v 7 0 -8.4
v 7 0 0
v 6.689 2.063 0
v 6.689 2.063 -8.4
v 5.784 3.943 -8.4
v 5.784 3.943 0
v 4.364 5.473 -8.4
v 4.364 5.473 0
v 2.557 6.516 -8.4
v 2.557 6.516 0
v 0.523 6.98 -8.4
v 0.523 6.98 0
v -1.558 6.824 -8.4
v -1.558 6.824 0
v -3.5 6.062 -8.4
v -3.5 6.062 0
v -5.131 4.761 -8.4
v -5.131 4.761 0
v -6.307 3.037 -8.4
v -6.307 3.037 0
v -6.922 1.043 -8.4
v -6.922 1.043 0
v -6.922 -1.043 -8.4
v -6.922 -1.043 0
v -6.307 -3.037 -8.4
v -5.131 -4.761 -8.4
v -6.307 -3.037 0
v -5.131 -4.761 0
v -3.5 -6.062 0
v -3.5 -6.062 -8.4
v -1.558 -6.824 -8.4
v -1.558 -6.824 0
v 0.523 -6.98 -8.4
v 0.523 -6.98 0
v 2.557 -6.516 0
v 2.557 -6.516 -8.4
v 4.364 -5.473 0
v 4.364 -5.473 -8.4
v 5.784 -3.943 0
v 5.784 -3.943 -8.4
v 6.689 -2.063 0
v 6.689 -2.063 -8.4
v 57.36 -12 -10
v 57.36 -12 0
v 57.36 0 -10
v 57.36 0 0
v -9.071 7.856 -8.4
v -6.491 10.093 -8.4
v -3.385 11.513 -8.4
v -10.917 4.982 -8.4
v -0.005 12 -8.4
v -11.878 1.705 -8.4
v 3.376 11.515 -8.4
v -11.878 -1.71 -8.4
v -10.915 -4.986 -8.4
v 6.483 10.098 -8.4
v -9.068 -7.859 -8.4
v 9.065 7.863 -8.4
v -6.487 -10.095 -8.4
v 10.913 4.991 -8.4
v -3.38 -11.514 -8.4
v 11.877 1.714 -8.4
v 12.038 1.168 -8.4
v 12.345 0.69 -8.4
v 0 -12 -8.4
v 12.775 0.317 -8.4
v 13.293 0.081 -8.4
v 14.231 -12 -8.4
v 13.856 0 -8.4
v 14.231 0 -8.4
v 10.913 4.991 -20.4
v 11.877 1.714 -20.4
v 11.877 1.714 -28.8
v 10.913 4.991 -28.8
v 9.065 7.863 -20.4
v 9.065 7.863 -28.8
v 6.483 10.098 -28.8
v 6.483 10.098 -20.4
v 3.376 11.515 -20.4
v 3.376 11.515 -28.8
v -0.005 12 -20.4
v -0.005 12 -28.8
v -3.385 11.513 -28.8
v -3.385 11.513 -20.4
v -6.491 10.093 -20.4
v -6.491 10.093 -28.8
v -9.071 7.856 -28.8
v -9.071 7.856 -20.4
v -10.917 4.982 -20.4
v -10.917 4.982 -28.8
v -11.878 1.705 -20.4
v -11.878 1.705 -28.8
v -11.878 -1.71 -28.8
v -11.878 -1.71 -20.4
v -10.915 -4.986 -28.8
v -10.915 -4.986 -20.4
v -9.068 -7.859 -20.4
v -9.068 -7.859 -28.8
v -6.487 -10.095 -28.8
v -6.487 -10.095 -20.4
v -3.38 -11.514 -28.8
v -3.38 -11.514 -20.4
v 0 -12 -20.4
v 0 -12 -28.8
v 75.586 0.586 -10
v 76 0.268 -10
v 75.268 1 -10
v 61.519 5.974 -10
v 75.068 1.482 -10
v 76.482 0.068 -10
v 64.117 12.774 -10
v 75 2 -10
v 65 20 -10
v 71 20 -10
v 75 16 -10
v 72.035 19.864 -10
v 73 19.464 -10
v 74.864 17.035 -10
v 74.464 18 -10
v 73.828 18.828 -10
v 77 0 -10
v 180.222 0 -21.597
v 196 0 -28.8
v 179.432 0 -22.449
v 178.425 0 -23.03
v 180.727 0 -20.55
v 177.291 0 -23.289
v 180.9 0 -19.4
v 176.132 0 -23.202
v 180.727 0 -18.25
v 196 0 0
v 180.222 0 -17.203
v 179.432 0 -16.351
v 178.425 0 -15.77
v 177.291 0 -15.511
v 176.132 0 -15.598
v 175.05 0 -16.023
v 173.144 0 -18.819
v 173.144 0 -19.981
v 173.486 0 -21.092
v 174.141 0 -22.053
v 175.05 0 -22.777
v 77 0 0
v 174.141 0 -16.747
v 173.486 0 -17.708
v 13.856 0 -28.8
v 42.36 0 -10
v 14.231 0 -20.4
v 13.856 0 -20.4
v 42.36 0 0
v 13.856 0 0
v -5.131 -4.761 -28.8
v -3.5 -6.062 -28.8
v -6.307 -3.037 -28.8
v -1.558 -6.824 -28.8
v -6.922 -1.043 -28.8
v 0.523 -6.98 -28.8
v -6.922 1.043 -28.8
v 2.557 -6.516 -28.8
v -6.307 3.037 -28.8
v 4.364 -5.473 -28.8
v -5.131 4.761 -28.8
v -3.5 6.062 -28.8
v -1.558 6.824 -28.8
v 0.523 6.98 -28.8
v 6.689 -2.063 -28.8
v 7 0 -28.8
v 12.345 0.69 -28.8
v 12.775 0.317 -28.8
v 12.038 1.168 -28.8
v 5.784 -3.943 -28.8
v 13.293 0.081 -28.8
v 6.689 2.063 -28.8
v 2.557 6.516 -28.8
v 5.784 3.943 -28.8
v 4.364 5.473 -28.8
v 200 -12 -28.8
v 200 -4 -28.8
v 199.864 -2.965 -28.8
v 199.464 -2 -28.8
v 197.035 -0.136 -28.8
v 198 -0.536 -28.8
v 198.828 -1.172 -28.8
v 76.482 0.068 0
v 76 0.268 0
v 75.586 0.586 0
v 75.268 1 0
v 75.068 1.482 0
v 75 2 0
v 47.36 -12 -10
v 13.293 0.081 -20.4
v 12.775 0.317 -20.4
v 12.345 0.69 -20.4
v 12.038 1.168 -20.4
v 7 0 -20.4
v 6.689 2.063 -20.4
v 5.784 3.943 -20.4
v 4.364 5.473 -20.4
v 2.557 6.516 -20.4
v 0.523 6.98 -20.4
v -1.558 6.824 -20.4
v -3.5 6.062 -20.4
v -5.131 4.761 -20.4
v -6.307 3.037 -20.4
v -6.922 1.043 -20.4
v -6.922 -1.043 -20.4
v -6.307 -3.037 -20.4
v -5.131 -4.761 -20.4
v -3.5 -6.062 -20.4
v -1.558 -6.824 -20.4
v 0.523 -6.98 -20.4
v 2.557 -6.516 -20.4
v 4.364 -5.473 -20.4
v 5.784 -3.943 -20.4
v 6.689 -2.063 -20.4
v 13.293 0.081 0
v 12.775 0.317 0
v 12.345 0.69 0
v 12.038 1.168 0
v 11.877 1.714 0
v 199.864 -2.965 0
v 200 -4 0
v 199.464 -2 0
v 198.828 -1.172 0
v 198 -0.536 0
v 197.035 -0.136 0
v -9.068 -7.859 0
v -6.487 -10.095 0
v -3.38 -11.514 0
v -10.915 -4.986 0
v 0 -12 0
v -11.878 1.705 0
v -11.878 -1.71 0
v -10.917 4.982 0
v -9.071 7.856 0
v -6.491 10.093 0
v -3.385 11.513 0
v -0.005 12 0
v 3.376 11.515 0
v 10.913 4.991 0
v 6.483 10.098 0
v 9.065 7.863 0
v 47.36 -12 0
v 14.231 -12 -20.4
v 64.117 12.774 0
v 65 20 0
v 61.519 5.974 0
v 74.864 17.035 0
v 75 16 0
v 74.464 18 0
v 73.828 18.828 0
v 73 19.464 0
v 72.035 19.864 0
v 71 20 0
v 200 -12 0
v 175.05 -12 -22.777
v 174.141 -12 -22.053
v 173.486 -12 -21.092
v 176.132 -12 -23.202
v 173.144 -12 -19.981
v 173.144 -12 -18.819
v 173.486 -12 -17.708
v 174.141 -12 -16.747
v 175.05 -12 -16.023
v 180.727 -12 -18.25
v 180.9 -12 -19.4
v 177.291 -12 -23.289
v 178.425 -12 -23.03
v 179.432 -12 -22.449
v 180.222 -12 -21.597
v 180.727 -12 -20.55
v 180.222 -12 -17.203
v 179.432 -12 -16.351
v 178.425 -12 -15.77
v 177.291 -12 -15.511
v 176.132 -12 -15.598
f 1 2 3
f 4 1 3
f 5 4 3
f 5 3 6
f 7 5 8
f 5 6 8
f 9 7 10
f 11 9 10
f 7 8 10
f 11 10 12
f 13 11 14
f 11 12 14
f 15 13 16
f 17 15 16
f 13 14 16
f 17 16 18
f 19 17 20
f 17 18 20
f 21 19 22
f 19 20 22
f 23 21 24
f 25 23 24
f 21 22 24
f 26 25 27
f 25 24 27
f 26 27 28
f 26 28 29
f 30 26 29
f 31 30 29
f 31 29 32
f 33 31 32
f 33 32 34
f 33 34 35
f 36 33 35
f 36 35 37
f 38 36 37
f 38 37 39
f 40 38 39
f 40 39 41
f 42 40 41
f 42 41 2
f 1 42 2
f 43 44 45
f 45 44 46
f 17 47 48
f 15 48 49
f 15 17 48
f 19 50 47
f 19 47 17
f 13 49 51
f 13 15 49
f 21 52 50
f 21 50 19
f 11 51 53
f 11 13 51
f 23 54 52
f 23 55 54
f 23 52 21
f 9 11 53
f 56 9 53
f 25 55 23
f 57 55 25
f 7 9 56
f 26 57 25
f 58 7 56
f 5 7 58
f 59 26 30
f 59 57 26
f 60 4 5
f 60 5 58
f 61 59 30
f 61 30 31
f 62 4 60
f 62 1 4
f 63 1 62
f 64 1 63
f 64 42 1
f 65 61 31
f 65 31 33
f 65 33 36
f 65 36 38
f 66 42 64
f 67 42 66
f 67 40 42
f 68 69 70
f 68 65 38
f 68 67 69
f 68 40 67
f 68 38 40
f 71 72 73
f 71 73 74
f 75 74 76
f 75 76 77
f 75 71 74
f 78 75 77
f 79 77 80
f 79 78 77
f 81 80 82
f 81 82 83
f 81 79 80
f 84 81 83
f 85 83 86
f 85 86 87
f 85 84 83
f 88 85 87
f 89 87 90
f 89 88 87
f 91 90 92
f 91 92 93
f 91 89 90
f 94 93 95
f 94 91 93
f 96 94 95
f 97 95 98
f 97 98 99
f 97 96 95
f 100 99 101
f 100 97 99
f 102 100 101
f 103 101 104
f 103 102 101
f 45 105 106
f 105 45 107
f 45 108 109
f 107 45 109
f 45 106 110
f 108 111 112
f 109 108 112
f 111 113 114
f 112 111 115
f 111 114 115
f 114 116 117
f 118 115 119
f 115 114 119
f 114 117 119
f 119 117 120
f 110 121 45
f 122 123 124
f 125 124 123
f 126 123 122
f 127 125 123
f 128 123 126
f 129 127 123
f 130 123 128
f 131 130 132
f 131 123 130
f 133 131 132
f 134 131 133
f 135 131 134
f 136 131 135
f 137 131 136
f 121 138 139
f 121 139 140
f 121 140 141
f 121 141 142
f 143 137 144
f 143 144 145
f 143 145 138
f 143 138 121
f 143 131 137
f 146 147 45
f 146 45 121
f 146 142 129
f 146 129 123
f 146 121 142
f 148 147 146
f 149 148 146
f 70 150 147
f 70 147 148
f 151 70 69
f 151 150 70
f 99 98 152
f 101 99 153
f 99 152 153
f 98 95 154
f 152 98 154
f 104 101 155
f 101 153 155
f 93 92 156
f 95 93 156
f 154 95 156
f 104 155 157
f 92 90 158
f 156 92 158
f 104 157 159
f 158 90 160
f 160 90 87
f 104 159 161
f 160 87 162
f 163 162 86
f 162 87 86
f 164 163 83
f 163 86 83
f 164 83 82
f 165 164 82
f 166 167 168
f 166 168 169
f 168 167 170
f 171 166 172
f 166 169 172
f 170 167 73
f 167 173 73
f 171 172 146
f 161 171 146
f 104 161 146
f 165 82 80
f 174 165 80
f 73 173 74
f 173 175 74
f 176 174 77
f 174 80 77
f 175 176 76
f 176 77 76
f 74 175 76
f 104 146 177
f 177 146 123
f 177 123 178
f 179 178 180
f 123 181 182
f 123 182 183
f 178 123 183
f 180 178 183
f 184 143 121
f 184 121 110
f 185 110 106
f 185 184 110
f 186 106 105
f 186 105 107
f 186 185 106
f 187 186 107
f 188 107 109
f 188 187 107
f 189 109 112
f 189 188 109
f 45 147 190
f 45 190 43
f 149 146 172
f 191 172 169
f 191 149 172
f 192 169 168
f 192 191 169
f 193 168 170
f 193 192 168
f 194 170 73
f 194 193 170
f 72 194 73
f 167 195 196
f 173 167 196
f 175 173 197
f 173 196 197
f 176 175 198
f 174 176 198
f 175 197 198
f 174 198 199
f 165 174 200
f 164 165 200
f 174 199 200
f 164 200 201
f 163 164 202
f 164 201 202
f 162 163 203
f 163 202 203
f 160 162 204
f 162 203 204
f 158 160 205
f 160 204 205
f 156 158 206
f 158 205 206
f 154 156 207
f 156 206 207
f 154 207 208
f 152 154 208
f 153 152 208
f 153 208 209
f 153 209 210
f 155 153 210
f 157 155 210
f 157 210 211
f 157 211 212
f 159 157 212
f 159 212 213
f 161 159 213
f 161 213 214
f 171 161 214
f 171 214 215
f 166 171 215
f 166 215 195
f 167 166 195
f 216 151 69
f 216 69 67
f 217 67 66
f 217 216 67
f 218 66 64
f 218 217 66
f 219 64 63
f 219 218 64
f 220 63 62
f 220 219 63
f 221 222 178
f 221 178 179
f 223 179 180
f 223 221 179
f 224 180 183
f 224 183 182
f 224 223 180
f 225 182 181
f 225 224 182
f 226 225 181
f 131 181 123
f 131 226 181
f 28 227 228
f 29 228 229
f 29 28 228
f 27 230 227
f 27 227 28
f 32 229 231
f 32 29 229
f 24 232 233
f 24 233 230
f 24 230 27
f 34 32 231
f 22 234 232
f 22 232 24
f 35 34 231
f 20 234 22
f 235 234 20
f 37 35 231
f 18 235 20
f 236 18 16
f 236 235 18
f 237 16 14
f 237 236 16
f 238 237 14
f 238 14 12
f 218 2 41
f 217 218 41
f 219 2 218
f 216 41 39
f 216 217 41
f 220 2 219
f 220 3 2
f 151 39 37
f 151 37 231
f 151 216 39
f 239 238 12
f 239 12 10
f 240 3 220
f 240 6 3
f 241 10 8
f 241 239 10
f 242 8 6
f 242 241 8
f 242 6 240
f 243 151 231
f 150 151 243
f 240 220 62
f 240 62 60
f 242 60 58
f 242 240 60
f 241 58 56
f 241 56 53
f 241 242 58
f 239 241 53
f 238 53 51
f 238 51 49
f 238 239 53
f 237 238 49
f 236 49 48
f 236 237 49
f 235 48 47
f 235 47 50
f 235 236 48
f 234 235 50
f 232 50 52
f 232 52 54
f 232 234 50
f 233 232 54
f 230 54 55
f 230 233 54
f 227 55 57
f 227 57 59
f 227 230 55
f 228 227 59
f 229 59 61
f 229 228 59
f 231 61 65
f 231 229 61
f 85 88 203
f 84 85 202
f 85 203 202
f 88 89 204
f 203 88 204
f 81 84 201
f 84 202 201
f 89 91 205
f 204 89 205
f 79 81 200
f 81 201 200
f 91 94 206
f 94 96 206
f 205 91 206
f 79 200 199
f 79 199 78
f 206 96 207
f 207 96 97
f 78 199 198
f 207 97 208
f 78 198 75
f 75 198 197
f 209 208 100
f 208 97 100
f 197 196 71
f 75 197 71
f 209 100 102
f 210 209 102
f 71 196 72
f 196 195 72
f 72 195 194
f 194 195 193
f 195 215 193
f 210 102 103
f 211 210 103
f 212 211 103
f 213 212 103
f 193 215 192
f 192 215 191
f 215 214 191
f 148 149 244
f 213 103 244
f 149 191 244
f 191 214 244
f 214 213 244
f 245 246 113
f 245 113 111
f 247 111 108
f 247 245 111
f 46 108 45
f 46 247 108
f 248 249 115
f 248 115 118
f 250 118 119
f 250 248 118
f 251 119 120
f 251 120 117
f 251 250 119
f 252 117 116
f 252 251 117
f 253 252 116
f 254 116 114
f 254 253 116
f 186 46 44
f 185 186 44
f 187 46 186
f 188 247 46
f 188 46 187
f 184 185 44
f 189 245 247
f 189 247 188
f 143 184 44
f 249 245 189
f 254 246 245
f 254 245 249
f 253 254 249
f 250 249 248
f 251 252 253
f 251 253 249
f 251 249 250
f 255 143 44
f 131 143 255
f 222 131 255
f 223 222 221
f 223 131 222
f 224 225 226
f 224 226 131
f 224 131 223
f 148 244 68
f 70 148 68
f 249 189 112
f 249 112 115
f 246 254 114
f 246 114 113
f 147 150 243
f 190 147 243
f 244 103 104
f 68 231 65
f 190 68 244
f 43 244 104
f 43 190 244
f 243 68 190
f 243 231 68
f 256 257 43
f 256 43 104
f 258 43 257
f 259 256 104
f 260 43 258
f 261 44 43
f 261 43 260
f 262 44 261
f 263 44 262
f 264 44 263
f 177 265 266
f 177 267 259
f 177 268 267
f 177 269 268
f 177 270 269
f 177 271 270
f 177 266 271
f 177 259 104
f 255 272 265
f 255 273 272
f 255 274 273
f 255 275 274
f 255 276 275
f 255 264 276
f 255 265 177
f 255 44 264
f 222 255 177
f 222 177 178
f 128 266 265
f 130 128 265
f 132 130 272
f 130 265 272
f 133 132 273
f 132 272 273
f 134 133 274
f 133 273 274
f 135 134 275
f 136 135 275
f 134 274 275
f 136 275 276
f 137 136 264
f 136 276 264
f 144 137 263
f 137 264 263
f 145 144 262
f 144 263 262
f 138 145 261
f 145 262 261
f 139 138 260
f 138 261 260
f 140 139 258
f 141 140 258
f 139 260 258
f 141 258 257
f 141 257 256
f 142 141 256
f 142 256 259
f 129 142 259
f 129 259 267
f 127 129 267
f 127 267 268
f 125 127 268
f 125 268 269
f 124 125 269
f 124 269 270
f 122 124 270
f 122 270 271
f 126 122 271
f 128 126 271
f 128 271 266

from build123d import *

# Parameters (mm, degrees)
F0_R     = 7
F1_DEPTH = 28.8
F2_DEPTH = 10
F3_DEPTH = 10
F4_R     = 3.9
F5_DEPTH = 32.001
F6_W     = 30
F6_H     = 12
F7_DEPTH = 50


with BuildPart() as f1:
    # F0 (on Top) → F1 (new body)
    with BuildSketch(Plane.XY):
        with BuildLine():
            Line((57.36, 0), (57.36, -12))
            Line((57.36, -12), (200, -12))
            Line((200, -12), (200, -4))
            ThreePointArc((200, -4), (198.828427, -1.171573), (196, 0))
            Line((196, 0), (77, 0))
            Line((77, 0), (57.36, 0))
        make_face()
        with BuildLine():
            ThreePointArc((11.87692, 1.714286), (-9.071147, 7.855844), (0, -12))
            Line((0, -12), (47.36, -12))
            Line((47.36, -12), (42.36, 0))
            Line((42.36, 0), (13.856406, 0))
            ThreePointArc((13.856406, 0), (12.547099, 0.488142), (11.87692, 1.714286))
        make_face()
        Circle(F0_R, mode=Mode.SUBTRACT)
        Polygon((42.36, 0), (47.36, -12), (57.36, -12), (57.36, 0), align=None)
    extrude(amount=-F1_DEPTH)

    # F0 (on Top) → F2 (join)
    with BuildSketch(Plane.XY):
        with BuildLine():
            ThreePointArc((65, 20), (63.024853, 9.295266), (57.36, 0))
            Line((57.36, 0), (77, 0))
            ThreePointArc((77, 0), (75.585786, 0.585786), (75, 2))
            Line((75, 2), (75, 16))
            ThreePointArc((75, 16), (73.828427, 18.828427), (71, 20))
            Line((71, 20), (65, 20))
        make_face()
    extrude(amount=-F2_DEPTH)

    # F0 (on Top) → F3 (cut)
    with BuildSketch(Plane.XY):
        Polygon((42.36, 0), (47.36, -12), (57.36, -12), (57.36, 0), align=None)
    extrude(amount=-F3_DEPTH, mode=Mode.SUBTRACT)

    # F4 (on face) → F5 (cut, through all)
    with BuildSketch(Plane.XZ.offset(12)):
        with Locations((177, -19.4)):
            Circle(F4_R)
    extrude(amount=-F5_DEPTH, mode=Mode.SUBTRACT)

    # F6 (on Front) → F7 (cut, symmetric)
    with BuildSketch(Plane.XZ):
        with Locations((-0.769001, -14.4)):
            Rectangle(F6_W, F6_H)
    extrude(amount=F7_DEPTH, both=True, mode=Mode.SUBTRACT)


solid = f1.part
